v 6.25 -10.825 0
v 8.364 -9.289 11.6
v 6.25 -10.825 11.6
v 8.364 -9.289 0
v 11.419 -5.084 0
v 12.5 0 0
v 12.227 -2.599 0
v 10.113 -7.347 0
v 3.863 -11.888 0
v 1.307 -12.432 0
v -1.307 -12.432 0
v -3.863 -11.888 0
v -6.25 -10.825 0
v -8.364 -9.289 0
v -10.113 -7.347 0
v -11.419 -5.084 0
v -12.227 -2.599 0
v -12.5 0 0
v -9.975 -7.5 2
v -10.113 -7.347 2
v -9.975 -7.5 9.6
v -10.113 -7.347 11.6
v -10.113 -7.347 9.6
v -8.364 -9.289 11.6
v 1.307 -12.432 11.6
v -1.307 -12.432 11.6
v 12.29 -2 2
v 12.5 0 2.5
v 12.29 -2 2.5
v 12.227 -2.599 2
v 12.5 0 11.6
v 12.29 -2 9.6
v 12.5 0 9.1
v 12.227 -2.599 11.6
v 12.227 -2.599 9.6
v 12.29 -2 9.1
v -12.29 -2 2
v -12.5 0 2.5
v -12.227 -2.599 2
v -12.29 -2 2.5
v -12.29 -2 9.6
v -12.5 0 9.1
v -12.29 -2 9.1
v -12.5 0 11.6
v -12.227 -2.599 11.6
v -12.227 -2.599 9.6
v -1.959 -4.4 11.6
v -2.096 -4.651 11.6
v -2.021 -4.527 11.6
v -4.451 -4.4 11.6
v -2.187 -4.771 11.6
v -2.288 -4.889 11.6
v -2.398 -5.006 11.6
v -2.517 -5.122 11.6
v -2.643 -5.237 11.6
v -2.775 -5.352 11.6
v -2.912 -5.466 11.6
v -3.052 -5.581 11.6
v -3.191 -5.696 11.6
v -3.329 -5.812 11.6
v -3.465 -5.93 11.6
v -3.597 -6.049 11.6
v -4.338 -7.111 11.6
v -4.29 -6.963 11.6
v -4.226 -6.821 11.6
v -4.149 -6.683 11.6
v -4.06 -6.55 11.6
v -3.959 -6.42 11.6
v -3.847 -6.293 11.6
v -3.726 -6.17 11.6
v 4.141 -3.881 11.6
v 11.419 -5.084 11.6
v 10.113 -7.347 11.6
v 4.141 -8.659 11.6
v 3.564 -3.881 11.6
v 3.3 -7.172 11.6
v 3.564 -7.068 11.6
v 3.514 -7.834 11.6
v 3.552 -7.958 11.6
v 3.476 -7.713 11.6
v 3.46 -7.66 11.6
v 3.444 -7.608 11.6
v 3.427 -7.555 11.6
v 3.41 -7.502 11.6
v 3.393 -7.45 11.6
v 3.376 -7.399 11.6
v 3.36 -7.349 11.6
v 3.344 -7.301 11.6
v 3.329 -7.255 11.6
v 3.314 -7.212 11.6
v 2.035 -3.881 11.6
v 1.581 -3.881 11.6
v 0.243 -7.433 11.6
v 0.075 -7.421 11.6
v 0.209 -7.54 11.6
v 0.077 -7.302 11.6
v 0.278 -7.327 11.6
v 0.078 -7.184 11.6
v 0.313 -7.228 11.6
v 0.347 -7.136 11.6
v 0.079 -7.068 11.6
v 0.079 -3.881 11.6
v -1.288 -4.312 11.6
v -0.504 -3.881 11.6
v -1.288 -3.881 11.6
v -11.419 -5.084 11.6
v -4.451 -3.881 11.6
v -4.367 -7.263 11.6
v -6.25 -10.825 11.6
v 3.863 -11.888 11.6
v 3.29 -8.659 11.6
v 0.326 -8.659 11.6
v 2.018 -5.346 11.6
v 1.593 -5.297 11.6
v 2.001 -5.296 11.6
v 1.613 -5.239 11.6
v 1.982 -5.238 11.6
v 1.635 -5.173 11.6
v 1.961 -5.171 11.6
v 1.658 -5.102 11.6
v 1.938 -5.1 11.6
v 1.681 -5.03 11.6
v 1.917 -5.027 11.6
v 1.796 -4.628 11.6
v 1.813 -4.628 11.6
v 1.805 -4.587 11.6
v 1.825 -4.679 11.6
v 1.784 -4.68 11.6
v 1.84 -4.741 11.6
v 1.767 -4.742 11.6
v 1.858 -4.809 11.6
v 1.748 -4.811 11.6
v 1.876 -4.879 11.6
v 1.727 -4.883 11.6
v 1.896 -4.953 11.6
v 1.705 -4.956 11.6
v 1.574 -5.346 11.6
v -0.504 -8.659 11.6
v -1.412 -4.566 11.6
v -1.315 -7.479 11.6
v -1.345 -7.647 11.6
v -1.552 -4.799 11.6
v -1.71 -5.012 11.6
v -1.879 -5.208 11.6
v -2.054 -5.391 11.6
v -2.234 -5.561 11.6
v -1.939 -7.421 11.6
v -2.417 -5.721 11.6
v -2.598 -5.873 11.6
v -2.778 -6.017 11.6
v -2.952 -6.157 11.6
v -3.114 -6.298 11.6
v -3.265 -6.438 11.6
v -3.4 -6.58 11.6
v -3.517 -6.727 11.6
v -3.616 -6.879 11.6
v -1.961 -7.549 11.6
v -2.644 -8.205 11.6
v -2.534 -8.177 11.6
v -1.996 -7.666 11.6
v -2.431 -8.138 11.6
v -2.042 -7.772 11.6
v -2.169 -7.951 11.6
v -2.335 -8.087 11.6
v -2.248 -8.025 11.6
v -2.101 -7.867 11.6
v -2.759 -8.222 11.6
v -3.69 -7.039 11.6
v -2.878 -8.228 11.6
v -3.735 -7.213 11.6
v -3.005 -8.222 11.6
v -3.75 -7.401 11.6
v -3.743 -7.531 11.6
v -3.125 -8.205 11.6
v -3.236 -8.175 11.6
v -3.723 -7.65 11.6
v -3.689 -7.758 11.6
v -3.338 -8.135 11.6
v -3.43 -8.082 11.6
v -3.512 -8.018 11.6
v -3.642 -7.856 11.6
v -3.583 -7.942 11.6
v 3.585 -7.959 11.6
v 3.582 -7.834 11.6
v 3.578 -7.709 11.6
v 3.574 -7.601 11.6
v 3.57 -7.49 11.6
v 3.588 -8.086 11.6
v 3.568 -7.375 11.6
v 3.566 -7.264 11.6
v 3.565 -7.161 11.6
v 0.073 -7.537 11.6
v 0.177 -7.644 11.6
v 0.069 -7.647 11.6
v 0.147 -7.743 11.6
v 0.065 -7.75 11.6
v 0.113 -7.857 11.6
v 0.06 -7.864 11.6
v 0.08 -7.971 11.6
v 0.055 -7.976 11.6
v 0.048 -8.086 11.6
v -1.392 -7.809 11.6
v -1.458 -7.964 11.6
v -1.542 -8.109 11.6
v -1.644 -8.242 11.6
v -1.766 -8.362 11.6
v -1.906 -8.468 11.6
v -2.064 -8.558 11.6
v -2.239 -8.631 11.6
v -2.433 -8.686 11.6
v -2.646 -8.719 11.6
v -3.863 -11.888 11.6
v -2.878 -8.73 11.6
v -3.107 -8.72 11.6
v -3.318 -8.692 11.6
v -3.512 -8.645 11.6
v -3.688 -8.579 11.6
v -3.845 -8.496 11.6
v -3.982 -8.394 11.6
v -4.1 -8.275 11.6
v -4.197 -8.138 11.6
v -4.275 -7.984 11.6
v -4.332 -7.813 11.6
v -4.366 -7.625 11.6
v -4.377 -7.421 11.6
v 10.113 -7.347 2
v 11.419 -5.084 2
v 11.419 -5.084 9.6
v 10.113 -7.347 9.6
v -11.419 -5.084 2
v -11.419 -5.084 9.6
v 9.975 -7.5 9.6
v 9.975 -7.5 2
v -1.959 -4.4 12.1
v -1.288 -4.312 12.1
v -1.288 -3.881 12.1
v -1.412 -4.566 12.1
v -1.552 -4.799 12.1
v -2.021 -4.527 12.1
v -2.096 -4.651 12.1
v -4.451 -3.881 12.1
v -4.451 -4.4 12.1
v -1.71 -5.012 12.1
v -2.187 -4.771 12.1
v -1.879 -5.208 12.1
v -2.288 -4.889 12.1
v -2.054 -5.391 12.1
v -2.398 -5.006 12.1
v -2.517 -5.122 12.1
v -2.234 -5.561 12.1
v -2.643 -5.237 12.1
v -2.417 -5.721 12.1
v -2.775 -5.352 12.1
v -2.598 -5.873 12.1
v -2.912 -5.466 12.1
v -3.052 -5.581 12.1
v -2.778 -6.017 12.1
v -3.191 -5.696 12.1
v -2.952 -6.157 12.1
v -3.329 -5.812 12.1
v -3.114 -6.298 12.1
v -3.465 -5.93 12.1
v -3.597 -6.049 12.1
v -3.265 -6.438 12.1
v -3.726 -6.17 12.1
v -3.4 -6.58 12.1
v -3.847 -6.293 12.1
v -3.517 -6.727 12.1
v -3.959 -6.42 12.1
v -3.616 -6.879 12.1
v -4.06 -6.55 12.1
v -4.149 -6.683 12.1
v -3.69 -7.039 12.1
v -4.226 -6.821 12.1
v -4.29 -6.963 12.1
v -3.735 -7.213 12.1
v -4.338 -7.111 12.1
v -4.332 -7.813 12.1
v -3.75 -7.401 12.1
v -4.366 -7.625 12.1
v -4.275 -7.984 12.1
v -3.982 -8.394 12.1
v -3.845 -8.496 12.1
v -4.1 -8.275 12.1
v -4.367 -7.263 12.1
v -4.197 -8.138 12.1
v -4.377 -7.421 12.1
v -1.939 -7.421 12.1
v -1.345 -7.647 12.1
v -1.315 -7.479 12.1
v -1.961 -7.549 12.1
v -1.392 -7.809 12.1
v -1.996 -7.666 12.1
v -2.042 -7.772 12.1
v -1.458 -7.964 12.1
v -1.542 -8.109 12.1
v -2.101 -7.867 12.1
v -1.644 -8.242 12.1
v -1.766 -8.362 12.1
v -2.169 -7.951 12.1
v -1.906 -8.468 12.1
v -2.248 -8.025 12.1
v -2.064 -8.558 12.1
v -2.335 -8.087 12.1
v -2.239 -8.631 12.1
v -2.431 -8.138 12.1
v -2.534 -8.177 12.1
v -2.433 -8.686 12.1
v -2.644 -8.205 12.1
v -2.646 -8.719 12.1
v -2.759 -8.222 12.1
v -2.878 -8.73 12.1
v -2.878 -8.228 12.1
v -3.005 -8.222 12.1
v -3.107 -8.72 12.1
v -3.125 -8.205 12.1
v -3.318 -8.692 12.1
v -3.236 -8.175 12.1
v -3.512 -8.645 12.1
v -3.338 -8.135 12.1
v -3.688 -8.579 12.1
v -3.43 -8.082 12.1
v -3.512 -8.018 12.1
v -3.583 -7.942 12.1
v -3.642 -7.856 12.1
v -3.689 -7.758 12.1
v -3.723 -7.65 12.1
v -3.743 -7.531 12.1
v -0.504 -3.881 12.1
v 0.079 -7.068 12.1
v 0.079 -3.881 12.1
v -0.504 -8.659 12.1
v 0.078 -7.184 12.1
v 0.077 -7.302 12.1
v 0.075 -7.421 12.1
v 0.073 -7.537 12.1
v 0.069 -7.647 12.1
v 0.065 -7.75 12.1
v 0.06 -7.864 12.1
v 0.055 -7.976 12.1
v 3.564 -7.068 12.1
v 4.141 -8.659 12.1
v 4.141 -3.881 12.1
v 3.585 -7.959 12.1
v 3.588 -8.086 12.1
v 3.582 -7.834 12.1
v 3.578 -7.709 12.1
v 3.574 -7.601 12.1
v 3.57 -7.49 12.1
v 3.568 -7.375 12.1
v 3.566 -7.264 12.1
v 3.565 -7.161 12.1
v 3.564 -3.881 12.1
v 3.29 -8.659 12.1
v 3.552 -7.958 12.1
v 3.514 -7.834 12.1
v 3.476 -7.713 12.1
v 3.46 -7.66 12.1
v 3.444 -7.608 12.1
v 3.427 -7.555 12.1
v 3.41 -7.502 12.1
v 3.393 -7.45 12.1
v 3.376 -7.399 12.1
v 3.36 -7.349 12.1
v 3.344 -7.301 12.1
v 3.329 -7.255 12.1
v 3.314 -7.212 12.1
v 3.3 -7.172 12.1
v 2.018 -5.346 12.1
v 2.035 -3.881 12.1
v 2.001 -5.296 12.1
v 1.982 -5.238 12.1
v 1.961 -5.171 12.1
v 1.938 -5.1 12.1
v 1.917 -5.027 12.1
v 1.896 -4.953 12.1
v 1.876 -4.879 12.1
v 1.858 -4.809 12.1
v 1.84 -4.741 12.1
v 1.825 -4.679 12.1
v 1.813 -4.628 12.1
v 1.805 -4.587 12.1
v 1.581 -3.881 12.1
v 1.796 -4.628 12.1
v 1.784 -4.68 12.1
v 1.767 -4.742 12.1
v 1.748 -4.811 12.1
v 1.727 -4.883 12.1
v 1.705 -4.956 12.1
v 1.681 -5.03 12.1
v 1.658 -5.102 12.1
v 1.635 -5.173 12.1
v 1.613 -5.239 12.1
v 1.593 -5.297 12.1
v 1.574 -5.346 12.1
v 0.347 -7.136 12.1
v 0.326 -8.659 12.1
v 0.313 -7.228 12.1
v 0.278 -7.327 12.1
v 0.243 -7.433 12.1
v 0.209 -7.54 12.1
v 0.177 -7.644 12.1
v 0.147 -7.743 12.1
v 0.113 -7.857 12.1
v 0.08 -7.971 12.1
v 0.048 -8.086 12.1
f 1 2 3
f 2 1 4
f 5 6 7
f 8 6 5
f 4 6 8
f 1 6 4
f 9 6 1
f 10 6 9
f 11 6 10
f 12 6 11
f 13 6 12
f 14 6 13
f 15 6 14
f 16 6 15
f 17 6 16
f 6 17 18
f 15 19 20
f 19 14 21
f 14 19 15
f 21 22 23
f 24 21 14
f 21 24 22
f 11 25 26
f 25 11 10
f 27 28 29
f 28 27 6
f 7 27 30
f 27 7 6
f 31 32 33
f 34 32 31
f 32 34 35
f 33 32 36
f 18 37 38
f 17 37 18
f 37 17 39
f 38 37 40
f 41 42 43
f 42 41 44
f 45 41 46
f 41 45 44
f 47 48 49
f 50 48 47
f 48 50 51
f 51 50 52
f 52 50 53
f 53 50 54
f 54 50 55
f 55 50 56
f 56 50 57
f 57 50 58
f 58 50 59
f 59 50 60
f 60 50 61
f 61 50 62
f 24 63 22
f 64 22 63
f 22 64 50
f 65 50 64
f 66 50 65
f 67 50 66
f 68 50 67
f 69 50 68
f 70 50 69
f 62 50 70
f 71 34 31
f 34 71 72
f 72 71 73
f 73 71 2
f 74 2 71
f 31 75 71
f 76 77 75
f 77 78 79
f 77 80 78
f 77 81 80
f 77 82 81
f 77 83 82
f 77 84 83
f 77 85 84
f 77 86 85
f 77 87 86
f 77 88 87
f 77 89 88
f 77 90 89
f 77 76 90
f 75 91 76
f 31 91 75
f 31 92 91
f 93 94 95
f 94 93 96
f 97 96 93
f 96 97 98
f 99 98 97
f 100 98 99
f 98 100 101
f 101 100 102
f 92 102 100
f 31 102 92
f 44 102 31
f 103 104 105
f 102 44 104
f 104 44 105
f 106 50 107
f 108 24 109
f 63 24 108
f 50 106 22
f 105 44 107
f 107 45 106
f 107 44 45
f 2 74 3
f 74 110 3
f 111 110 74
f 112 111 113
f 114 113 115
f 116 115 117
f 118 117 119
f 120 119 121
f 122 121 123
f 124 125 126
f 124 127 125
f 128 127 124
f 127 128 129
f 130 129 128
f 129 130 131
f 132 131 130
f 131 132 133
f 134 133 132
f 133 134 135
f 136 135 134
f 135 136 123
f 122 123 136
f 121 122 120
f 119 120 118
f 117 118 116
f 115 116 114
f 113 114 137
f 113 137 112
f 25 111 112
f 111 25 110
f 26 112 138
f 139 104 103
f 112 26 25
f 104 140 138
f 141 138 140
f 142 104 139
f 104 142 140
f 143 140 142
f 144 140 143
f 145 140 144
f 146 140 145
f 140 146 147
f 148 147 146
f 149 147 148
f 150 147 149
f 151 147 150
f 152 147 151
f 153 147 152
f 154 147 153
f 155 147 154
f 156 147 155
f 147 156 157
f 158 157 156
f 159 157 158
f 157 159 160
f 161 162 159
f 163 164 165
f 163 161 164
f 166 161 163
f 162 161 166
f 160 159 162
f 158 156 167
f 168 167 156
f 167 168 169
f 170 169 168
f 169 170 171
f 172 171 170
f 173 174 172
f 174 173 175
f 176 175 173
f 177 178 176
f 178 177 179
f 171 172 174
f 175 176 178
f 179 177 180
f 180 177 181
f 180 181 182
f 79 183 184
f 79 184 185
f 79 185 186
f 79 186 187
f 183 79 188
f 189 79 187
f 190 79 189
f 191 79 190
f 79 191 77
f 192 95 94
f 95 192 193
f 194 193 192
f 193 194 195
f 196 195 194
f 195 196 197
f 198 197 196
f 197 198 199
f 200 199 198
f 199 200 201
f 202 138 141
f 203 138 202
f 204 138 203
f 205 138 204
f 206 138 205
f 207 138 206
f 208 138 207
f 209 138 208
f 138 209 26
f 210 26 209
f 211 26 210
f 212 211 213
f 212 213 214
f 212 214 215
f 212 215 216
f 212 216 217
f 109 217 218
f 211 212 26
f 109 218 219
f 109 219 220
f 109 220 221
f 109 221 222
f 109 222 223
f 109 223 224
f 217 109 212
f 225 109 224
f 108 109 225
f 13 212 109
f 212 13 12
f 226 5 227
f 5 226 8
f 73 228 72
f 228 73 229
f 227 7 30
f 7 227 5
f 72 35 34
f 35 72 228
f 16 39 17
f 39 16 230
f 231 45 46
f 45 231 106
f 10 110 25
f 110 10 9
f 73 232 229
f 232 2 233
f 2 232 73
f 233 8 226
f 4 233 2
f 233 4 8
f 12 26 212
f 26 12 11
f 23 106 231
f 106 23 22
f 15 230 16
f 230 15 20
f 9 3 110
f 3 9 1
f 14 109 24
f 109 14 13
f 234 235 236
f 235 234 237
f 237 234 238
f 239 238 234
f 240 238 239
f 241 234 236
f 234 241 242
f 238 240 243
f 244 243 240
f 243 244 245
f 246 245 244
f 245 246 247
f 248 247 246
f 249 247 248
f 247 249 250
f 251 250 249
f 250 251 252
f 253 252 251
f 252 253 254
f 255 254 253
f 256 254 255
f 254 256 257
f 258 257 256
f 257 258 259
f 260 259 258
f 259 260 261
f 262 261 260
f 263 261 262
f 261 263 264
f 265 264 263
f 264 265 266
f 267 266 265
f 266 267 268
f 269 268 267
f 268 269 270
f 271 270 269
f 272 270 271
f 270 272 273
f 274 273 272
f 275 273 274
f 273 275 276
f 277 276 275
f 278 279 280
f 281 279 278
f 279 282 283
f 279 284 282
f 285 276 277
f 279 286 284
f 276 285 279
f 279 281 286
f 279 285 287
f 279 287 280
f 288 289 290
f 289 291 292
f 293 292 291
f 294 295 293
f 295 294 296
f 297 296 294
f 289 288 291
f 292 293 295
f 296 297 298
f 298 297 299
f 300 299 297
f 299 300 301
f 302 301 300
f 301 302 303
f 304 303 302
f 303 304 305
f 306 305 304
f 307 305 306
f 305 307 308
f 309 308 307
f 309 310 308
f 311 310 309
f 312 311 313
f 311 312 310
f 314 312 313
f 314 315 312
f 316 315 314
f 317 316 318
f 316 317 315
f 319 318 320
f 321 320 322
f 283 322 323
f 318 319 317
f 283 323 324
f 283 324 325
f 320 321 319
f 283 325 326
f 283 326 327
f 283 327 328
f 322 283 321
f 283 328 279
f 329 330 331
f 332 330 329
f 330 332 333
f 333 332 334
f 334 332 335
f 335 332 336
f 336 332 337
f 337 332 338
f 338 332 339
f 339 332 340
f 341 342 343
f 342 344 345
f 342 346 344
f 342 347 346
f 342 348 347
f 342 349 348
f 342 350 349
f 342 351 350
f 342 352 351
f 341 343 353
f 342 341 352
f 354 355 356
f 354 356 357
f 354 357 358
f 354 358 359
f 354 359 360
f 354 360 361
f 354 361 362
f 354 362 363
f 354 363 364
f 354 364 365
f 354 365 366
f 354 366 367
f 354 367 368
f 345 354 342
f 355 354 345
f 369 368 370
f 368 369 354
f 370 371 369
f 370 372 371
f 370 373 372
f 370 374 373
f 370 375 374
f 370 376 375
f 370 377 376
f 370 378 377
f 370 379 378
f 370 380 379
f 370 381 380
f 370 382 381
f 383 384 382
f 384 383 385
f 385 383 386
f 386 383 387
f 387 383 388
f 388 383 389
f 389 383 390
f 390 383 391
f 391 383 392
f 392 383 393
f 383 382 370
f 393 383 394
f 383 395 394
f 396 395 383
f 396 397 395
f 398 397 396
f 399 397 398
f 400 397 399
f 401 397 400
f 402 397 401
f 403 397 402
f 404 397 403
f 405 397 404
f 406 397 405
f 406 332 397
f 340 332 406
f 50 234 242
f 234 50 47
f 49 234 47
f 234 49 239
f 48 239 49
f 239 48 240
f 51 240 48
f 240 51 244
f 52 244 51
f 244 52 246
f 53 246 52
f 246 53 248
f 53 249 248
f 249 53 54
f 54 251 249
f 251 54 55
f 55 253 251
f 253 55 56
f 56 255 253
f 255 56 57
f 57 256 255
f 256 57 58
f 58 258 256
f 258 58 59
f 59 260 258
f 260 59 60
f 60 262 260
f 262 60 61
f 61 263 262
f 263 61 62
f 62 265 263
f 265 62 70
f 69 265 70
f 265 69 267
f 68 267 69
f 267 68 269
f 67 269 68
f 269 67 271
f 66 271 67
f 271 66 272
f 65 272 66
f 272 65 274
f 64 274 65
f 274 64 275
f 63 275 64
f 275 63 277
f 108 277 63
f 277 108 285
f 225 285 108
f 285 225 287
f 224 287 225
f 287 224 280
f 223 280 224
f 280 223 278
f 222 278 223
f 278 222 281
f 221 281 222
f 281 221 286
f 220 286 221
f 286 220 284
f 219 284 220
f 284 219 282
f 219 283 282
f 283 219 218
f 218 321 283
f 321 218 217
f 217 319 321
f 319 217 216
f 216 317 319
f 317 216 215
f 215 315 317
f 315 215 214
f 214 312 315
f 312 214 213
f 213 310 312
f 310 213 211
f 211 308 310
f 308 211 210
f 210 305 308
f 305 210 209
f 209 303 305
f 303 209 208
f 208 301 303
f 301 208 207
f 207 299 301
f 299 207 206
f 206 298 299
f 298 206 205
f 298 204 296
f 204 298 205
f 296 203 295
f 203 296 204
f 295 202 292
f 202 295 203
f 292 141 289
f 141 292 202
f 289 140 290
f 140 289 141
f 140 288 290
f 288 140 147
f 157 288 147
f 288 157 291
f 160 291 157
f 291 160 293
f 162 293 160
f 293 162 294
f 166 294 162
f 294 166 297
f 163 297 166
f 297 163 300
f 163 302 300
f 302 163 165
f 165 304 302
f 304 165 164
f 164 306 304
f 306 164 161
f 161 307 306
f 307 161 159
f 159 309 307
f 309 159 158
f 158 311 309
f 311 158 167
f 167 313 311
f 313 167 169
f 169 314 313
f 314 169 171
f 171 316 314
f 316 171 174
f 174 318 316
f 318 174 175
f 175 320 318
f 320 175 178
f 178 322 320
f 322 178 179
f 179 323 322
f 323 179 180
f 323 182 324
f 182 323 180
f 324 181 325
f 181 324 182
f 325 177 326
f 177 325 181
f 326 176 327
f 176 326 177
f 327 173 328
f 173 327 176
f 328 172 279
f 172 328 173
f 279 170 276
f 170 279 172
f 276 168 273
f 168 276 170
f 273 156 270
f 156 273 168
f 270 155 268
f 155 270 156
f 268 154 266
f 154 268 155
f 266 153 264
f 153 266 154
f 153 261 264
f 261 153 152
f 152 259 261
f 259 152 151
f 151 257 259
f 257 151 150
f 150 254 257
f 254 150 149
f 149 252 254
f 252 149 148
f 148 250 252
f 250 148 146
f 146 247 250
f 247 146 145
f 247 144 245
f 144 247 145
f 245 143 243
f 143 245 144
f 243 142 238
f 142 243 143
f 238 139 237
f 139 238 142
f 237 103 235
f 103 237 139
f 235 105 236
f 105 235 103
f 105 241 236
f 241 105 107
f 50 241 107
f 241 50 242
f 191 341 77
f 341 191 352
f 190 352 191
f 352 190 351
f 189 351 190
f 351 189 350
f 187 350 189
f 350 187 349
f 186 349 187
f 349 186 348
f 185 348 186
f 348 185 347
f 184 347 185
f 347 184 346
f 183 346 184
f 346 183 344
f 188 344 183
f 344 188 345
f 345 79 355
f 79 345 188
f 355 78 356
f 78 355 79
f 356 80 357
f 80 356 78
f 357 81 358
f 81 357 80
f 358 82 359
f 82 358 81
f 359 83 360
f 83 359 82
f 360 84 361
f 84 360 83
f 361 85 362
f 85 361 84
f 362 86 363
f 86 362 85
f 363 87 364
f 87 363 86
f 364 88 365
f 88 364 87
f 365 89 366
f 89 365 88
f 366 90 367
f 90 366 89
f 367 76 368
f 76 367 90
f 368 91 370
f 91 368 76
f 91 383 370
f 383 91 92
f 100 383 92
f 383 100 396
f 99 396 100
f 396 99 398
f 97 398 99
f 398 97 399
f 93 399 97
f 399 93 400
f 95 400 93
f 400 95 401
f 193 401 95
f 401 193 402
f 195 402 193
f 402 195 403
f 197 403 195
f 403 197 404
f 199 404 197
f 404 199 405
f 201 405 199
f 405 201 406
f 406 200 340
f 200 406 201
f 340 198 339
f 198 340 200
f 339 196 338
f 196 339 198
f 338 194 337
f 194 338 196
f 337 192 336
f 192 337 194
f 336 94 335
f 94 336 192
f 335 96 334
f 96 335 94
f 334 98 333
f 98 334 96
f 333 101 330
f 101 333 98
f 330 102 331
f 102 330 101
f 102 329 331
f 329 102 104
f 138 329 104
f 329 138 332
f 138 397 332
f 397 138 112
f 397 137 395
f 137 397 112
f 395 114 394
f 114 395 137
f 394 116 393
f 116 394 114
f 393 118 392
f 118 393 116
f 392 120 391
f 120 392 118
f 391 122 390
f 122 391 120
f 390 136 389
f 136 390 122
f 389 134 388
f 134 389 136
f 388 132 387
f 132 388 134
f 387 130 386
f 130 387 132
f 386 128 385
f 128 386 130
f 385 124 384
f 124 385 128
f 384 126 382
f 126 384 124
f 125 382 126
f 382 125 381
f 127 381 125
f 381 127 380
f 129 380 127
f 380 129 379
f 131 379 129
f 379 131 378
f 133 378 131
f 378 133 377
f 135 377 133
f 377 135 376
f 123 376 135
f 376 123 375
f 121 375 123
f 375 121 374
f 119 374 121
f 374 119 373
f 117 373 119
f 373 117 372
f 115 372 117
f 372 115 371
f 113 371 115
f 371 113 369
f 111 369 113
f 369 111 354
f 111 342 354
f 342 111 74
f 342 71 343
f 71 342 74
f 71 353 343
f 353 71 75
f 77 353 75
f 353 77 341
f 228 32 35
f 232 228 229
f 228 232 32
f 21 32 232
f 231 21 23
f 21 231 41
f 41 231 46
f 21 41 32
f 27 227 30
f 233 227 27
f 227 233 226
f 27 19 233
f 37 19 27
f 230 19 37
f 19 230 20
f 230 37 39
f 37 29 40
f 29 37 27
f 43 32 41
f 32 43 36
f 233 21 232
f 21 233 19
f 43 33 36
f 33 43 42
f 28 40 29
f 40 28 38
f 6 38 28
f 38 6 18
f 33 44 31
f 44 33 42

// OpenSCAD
//The height of the bed (mm)
bed_height=7.6; 

//Diameter of the circle (mm)
diameter= 25; // [10:50]

//The depth of the rift
rift=0.6; // [0.1:0.1:0.9]

//The thickness of the clamp (mm)
clampheight=2; // [1:0.1:5]

//The thickness of the claw (mm)
clawheight=0.5; // [0:0.1:1.5]

//The width of the claw (mm)
clawwidth= 2; // [1:0.1:5]


/* [Advanced] */

text="M2";
font = "Liberation Sans";
letter_size = 5; 
letter_height = 0.5; //mm





height= bed_height+clampheight*2;
radius = diameter/2;



module letter(l) {
  // Use linear_extrude() to make the letters 3D objects as they
  // are only 2D shapes when only using text()
  linear_extrude(height = letter_height+height) {
    text(l, size = letter_size, font = font, halign = "center", valign = "center", $fn = 16);
  }
}


 
difference()
{
    union()
    {
 color("gray") cylinder(height,radius,radius,false );
 color("red")    translate([0, -radius/2, 0]) rotate([0, 0, 180]) letter(text);
    }

translate([-radius,0,0])
cube([diameter,radius,height]);


union()
{
translate([-radius,-radius*rift,(height-bed_height)/2])
cube([diameter, radius*rift-clawwidth,bed_height]);

translate([-radius,-radius*rift,(height-bed_height+clawheight*2)/2])
cube([diameter, radius*rift,bed_height-clawheight*2]);
}

}



